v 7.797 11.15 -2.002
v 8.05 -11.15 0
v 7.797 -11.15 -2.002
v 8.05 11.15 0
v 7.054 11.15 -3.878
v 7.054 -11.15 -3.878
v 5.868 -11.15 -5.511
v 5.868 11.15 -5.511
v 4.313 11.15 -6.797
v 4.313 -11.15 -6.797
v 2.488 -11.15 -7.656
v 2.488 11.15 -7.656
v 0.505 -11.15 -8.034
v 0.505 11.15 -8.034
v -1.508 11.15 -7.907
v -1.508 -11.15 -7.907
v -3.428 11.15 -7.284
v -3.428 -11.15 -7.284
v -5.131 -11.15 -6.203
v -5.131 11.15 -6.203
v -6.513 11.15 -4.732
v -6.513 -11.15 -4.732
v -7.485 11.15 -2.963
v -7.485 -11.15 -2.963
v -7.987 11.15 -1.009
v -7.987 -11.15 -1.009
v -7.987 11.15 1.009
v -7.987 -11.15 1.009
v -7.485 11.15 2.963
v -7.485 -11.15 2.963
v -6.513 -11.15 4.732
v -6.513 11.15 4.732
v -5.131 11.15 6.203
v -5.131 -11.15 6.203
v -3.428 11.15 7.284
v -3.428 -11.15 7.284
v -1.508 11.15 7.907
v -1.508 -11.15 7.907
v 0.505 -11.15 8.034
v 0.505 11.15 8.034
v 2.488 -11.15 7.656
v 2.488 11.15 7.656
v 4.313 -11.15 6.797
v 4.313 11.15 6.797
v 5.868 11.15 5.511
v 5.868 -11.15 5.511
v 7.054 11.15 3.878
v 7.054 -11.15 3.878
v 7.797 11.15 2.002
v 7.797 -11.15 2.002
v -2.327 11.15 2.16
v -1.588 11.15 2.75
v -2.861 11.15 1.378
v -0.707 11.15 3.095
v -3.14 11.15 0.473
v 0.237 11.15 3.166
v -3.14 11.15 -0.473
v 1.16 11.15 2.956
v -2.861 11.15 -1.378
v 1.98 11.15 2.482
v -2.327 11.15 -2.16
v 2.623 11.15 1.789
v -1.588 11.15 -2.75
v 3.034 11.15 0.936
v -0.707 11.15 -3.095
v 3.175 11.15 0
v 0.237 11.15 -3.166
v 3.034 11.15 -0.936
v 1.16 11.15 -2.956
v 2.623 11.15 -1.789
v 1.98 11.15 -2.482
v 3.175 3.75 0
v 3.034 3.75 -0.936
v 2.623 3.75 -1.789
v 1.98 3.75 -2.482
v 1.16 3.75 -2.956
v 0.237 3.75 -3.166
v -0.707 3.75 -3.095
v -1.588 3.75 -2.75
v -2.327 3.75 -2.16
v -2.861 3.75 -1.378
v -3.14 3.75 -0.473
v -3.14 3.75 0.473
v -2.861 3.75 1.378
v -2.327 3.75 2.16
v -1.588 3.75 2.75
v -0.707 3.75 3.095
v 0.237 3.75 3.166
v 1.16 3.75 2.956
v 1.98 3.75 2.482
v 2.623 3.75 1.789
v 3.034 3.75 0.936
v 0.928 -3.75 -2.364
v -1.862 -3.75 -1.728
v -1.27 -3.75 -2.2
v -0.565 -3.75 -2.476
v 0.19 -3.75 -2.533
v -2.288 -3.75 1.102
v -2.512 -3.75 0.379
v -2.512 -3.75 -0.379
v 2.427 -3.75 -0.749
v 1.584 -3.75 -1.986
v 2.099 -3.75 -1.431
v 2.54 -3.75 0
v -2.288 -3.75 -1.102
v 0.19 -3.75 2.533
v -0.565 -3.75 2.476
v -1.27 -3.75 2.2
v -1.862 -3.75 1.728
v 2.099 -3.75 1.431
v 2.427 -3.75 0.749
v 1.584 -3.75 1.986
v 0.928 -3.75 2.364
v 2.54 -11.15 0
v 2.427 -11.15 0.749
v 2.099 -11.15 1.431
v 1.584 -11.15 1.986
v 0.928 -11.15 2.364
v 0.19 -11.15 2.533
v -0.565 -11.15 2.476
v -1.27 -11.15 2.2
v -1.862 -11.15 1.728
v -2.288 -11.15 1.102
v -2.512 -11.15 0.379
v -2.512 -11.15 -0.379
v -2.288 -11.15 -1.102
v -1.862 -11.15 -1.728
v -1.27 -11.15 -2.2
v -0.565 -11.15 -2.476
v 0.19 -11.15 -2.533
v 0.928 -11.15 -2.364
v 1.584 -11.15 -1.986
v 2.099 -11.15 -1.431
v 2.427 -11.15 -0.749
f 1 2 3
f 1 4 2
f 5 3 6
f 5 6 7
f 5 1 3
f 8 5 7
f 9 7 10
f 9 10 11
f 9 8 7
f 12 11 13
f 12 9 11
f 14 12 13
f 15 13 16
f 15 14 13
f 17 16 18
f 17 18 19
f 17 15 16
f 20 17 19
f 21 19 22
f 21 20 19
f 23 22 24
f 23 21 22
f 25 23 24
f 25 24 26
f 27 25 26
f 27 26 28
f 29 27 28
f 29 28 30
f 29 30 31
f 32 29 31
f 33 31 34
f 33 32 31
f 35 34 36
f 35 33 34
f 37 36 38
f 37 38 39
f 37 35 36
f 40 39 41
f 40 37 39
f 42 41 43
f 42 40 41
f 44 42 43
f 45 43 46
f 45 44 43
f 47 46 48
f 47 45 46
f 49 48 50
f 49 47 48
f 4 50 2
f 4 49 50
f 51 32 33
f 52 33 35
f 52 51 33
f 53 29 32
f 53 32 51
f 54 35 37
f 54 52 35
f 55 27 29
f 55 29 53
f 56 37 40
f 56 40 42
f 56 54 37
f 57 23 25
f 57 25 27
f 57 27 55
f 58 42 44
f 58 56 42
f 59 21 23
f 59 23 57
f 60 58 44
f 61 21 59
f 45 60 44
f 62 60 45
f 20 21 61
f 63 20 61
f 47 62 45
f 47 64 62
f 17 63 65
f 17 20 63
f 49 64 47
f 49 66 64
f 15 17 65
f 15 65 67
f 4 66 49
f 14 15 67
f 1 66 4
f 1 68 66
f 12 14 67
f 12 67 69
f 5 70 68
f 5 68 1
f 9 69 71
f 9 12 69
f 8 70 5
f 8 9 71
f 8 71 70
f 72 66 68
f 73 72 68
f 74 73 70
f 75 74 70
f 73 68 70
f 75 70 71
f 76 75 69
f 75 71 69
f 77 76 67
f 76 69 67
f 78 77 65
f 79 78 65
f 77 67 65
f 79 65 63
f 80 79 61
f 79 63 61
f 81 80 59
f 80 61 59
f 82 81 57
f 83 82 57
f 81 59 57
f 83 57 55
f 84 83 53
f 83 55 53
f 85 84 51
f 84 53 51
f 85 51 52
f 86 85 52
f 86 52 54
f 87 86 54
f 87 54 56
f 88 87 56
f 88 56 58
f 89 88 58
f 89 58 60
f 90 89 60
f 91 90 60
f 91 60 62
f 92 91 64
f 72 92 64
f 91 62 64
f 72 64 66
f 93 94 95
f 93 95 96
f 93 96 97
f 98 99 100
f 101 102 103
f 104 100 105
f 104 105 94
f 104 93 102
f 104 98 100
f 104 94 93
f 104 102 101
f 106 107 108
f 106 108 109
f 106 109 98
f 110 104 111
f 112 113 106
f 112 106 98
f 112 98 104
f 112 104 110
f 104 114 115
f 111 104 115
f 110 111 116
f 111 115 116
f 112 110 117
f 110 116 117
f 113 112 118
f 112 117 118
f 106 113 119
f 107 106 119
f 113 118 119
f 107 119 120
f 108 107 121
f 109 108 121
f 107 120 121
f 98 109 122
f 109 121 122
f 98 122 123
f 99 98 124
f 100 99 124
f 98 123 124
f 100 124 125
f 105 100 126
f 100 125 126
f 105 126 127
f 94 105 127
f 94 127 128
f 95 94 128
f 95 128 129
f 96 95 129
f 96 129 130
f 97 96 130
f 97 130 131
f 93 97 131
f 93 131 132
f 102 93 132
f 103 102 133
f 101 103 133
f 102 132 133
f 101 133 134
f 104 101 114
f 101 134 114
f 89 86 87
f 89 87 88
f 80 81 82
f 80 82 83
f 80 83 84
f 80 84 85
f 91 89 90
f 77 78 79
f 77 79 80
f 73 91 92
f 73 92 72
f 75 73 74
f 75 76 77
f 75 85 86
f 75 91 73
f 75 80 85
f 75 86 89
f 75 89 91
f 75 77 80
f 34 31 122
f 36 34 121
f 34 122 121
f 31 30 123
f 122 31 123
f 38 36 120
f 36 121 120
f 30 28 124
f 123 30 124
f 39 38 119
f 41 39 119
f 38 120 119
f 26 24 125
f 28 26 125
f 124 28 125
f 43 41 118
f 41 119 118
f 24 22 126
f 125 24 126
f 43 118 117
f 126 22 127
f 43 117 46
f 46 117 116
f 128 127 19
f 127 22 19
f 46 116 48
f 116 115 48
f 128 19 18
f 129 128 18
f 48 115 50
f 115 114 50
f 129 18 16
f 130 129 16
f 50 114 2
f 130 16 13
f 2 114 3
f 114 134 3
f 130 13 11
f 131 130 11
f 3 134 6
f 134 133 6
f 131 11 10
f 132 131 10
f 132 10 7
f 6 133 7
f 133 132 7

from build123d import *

# Parameters (mm, degrees)
SKETCH1_R           = 8.05
BOSS_EXTRUDE1_DEPTH = 11.15
SKETCH2_R           = 3.175
F_25_HOLE_DEPTH     = 7.4
SKETCH3_R           = 2.54
F_0_2_HOLE_DEPTH    = 7.4


with BuildPart() as part:
    # Sketch1 → Boss-Extrude1 (new body, symmetric)
    with BuildSketch(Plane(origin=(0, 0, 0), x_dir=(1, 0, 0), z_dir=(0, 1, 0))):
        Circle(SKETCH1_R)
    extrude(amount=BOSS_EXTRUDE1_DEPTH, both=True)

    # Sketch2 → .25" hole (cut)
    with BuildSketch(Plane(origin=(0, 11.15, 0), x_dir=(1, 0, 0), z_dir=(0, 1, 0))):
        Circle(SKETCH2_R)
    extrude(amount=-F_25_HOLE_DEPTH, mode=Mode.SUBTRACT)

    # Sketch3 → 0.2" hole (cut)
    with BuildSketch(Plane.XZ.offset(11.15)):
        Circle(SKETCH3_R)
    extrude(amount=-F_0_2_HOLE_DEPTH, mode=Mode.SUBTRACT)


solid = part.part
